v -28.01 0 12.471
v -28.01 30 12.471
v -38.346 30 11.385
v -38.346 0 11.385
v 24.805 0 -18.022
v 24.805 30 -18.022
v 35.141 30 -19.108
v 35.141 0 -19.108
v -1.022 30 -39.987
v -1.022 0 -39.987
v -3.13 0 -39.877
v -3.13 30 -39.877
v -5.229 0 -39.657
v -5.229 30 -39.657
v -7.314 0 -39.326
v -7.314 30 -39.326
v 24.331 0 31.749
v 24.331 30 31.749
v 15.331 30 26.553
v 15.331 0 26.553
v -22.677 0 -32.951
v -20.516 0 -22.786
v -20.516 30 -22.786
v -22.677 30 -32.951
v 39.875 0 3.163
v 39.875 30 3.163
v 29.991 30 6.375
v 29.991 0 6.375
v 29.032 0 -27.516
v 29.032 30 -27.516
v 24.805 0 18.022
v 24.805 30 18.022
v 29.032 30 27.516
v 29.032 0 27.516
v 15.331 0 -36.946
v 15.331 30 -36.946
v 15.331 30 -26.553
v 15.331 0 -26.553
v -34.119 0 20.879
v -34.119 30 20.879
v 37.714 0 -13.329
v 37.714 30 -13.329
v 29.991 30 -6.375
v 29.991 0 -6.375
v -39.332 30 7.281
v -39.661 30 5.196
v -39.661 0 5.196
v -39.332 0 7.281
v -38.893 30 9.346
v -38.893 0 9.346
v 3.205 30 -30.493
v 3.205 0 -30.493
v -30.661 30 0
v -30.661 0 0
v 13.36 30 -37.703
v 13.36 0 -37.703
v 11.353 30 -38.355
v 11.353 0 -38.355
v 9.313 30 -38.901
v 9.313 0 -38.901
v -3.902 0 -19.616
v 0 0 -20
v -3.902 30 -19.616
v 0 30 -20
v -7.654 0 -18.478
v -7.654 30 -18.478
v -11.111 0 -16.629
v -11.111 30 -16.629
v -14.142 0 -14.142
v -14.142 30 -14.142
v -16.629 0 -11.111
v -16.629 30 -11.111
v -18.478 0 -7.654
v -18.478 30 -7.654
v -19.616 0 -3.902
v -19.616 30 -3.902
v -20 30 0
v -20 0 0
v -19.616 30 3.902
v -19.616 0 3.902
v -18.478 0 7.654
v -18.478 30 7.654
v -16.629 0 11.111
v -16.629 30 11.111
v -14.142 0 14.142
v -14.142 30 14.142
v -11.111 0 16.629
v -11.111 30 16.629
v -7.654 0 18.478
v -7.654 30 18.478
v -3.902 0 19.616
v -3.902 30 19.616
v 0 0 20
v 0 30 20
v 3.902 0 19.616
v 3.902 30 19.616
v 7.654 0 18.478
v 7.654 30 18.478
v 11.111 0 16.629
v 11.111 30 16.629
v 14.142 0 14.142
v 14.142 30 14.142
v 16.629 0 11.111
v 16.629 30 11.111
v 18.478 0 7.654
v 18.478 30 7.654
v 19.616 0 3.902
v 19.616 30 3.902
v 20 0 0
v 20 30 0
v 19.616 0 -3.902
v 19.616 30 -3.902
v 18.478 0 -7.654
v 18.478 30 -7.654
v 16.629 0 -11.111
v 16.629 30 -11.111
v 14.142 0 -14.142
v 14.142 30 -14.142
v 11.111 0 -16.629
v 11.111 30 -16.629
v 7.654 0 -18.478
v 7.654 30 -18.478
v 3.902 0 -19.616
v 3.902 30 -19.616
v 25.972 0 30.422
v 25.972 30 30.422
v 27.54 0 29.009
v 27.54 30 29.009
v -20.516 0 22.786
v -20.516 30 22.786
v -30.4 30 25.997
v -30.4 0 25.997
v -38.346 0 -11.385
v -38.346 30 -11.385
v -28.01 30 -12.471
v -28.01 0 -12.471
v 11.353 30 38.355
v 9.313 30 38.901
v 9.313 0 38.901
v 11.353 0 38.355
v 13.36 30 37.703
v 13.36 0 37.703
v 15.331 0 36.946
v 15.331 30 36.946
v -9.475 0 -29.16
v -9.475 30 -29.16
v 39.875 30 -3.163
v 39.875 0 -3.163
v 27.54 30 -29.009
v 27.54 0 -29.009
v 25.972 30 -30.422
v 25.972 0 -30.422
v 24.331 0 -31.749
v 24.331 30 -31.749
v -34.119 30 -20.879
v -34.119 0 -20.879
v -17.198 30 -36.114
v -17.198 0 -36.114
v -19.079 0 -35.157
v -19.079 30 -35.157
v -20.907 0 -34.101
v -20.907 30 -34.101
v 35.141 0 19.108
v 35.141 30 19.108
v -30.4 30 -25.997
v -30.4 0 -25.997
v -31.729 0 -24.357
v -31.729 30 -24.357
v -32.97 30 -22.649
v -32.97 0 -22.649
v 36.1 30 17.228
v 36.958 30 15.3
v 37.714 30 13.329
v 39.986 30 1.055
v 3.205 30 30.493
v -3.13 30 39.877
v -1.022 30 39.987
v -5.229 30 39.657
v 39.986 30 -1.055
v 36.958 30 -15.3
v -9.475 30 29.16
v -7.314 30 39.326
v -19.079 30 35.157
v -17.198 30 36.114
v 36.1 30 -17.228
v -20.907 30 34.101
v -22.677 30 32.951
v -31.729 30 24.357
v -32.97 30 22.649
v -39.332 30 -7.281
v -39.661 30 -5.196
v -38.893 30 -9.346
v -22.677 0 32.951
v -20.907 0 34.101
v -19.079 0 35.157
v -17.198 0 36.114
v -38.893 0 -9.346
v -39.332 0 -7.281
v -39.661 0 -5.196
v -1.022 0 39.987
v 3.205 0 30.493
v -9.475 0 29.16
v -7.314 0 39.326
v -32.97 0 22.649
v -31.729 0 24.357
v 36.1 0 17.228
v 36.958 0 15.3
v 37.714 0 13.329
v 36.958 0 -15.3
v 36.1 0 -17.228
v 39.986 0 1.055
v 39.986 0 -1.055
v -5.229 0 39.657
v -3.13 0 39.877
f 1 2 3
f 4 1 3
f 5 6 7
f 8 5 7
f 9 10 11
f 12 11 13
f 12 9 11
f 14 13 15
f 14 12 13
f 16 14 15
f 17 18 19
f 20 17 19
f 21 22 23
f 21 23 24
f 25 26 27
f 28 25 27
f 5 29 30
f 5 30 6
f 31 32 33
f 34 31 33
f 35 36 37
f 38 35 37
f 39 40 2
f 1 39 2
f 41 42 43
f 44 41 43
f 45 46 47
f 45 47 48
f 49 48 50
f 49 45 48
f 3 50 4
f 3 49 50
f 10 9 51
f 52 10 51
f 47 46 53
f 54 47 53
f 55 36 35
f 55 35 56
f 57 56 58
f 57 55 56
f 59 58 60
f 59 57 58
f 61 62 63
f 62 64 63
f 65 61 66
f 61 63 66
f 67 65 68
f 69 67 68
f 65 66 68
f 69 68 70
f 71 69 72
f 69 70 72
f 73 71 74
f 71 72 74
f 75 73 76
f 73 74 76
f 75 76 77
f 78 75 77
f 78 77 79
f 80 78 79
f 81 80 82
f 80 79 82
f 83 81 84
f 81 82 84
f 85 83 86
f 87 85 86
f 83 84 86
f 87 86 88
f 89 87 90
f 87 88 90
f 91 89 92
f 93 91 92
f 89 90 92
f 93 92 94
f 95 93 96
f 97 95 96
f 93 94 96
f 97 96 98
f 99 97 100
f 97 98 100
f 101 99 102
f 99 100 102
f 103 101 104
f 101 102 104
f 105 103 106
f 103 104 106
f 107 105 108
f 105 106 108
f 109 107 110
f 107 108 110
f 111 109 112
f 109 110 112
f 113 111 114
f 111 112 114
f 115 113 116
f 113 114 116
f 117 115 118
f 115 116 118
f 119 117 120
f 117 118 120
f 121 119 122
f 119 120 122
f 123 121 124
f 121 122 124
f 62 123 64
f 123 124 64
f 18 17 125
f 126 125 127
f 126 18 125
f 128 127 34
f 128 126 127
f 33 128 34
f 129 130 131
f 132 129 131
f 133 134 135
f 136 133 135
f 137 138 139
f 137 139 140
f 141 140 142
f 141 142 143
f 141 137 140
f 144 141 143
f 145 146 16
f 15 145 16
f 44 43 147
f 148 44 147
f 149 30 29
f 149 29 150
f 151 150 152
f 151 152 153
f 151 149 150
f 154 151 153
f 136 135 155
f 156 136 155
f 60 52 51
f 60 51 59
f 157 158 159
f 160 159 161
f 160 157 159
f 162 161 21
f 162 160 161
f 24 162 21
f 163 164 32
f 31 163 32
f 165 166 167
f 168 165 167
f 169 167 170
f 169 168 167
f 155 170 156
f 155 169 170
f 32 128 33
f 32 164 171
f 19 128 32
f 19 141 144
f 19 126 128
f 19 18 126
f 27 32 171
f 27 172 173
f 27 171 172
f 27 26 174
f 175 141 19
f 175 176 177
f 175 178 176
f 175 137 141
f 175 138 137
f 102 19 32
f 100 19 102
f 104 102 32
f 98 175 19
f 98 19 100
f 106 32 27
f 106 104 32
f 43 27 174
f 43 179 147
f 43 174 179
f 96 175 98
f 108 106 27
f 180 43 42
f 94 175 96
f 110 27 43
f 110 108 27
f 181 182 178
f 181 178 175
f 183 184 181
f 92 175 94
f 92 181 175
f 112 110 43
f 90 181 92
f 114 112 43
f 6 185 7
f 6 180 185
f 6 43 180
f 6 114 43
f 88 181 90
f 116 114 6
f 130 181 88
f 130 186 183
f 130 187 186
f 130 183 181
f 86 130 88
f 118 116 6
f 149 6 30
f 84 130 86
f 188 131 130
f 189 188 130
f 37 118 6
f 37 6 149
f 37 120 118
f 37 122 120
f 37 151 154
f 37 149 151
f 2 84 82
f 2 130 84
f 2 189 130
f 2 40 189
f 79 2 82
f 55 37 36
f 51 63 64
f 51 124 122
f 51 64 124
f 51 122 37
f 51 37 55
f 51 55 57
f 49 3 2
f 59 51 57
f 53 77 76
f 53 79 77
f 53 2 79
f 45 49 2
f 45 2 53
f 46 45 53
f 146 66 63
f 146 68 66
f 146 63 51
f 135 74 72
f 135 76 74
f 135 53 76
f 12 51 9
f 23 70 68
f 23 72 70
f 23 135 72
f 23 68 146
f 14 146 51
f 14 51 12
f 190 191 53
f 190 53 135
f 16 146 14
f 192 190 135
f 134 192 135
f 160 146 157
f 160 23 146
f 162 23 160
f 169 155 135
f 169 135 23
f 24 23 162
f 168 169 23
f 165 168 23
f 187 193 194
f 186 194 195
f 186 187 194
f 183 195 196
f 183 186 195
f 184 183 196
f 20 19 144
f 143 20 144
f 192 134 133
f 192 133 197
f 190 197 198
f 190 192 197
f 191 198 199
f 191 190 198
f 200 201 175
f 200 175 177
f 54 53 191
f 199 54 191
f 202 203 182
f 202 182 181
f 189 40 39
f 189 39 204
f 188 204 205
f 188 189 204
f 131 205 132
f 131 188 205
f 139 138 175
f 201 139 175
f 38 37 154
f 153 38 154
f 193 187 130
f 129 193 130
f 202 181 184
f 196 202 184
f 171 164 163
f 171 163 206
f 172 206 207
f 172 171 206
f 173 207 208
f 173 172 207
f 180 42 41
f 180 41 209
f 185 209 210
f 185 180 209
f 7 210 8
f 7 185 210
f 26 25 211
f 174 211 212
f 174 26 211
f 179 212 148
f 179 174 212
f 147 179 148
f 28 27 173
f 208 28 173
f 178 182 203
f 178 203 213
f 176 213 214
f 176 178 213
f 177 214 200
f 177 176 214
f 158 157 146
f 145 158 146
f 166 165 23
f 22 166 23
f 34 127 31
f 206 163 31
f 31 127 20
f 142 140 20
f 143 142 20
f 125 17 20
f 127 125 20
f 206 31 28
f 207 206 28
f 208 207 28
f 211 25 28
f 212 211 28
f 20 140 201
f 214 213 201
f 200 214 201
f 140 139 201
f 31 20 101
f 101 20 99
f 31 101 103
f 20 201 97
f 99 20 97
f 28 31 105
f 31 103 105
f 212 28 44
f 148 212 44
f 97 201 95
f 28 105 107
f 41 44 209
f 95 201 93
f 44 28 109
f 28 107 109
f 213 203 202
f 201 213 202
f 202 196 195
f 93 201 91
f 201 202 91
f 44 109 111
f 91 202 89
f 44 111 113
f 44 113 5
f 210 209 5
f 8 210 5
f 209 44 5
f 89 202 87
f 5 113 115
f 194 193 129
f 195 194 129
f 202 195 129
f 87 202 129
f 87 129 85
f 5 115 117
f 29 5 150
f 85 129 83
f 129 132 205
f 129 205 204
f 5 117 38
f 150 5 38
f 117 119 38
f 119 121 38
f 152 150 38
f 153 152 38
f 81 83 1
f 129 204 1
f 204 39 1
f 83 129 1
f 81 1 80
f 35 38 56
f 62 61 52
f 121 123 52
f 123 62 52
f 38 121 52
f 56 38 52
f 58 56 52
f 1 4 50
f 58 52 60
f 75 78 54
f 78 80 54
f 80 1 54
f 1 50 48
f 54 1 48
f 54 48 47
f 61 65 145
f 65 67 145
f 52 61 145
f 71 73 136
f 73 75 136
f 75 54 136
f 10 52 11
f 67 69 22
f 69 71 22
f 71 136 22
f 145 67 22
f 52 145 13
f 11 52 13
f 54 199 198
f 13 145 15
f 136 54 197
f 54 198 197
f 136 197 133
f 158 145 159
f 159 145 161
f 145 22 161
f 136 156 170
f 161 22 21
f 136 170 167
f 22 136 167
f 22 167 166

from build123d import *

# Parameters (mm, degrees)
SKETCH_2_W               = 20
SKETCH_2_H               = 30
CUT_EXTRUDE_1_DEPTH      = 65.031242374
PATTERN_CIRCULAR_2_COUNT = 15


with BuildPart() as part:
    # 草图2 → 旋转1 (revolve)
    with BuildSketch(Plane.XY, mode=Mode.PRIVATE) as revolve_1_sk:
        with Locations((-30, 15)):
            Rectangle(SKETCH_2_W, SKETCH_2_H)
    revolve(revolve_1_sk.sketch.rotate(Axis((0, 0, 0), (0, 1, 0)), 270), axis=Axis((0, 0, 0), (0, 1, 0)))

    # 草图3 → 切除-拉伸1 (cut, through all)
    with BuildSketch(Plane(origin=(0, 30, 0), x_dir=(1, 0, 0), z_dir=(0, 1, 0))):
        Polygon((-30.66106403, 0), (-39.66106403, 5.196152423), (-48.66106403, 0), (-39.66106403, -5.196152423), align=None)
    cut_extrude_1 = extrude(amount=-CUT_EXTRUDE_1_DEPTH, mode=Mode.SUBTRACT)

    # 阵列(圆周)2: 切除-拉伸1 ×15 about axis
    pattern_circular_2_axis = Axis((0, 0, 0), (0, 1, 0))
    for i in range(1, PATTERN_CIRCULAR_2_COUNT):
        add(cut_extrude_1.rotate(pattern_circular_2_axis, i * 360 / PATTERN_CIRCULAR_2_COUNT), mode=Mode.SUBTRACT)


solid = part.part
